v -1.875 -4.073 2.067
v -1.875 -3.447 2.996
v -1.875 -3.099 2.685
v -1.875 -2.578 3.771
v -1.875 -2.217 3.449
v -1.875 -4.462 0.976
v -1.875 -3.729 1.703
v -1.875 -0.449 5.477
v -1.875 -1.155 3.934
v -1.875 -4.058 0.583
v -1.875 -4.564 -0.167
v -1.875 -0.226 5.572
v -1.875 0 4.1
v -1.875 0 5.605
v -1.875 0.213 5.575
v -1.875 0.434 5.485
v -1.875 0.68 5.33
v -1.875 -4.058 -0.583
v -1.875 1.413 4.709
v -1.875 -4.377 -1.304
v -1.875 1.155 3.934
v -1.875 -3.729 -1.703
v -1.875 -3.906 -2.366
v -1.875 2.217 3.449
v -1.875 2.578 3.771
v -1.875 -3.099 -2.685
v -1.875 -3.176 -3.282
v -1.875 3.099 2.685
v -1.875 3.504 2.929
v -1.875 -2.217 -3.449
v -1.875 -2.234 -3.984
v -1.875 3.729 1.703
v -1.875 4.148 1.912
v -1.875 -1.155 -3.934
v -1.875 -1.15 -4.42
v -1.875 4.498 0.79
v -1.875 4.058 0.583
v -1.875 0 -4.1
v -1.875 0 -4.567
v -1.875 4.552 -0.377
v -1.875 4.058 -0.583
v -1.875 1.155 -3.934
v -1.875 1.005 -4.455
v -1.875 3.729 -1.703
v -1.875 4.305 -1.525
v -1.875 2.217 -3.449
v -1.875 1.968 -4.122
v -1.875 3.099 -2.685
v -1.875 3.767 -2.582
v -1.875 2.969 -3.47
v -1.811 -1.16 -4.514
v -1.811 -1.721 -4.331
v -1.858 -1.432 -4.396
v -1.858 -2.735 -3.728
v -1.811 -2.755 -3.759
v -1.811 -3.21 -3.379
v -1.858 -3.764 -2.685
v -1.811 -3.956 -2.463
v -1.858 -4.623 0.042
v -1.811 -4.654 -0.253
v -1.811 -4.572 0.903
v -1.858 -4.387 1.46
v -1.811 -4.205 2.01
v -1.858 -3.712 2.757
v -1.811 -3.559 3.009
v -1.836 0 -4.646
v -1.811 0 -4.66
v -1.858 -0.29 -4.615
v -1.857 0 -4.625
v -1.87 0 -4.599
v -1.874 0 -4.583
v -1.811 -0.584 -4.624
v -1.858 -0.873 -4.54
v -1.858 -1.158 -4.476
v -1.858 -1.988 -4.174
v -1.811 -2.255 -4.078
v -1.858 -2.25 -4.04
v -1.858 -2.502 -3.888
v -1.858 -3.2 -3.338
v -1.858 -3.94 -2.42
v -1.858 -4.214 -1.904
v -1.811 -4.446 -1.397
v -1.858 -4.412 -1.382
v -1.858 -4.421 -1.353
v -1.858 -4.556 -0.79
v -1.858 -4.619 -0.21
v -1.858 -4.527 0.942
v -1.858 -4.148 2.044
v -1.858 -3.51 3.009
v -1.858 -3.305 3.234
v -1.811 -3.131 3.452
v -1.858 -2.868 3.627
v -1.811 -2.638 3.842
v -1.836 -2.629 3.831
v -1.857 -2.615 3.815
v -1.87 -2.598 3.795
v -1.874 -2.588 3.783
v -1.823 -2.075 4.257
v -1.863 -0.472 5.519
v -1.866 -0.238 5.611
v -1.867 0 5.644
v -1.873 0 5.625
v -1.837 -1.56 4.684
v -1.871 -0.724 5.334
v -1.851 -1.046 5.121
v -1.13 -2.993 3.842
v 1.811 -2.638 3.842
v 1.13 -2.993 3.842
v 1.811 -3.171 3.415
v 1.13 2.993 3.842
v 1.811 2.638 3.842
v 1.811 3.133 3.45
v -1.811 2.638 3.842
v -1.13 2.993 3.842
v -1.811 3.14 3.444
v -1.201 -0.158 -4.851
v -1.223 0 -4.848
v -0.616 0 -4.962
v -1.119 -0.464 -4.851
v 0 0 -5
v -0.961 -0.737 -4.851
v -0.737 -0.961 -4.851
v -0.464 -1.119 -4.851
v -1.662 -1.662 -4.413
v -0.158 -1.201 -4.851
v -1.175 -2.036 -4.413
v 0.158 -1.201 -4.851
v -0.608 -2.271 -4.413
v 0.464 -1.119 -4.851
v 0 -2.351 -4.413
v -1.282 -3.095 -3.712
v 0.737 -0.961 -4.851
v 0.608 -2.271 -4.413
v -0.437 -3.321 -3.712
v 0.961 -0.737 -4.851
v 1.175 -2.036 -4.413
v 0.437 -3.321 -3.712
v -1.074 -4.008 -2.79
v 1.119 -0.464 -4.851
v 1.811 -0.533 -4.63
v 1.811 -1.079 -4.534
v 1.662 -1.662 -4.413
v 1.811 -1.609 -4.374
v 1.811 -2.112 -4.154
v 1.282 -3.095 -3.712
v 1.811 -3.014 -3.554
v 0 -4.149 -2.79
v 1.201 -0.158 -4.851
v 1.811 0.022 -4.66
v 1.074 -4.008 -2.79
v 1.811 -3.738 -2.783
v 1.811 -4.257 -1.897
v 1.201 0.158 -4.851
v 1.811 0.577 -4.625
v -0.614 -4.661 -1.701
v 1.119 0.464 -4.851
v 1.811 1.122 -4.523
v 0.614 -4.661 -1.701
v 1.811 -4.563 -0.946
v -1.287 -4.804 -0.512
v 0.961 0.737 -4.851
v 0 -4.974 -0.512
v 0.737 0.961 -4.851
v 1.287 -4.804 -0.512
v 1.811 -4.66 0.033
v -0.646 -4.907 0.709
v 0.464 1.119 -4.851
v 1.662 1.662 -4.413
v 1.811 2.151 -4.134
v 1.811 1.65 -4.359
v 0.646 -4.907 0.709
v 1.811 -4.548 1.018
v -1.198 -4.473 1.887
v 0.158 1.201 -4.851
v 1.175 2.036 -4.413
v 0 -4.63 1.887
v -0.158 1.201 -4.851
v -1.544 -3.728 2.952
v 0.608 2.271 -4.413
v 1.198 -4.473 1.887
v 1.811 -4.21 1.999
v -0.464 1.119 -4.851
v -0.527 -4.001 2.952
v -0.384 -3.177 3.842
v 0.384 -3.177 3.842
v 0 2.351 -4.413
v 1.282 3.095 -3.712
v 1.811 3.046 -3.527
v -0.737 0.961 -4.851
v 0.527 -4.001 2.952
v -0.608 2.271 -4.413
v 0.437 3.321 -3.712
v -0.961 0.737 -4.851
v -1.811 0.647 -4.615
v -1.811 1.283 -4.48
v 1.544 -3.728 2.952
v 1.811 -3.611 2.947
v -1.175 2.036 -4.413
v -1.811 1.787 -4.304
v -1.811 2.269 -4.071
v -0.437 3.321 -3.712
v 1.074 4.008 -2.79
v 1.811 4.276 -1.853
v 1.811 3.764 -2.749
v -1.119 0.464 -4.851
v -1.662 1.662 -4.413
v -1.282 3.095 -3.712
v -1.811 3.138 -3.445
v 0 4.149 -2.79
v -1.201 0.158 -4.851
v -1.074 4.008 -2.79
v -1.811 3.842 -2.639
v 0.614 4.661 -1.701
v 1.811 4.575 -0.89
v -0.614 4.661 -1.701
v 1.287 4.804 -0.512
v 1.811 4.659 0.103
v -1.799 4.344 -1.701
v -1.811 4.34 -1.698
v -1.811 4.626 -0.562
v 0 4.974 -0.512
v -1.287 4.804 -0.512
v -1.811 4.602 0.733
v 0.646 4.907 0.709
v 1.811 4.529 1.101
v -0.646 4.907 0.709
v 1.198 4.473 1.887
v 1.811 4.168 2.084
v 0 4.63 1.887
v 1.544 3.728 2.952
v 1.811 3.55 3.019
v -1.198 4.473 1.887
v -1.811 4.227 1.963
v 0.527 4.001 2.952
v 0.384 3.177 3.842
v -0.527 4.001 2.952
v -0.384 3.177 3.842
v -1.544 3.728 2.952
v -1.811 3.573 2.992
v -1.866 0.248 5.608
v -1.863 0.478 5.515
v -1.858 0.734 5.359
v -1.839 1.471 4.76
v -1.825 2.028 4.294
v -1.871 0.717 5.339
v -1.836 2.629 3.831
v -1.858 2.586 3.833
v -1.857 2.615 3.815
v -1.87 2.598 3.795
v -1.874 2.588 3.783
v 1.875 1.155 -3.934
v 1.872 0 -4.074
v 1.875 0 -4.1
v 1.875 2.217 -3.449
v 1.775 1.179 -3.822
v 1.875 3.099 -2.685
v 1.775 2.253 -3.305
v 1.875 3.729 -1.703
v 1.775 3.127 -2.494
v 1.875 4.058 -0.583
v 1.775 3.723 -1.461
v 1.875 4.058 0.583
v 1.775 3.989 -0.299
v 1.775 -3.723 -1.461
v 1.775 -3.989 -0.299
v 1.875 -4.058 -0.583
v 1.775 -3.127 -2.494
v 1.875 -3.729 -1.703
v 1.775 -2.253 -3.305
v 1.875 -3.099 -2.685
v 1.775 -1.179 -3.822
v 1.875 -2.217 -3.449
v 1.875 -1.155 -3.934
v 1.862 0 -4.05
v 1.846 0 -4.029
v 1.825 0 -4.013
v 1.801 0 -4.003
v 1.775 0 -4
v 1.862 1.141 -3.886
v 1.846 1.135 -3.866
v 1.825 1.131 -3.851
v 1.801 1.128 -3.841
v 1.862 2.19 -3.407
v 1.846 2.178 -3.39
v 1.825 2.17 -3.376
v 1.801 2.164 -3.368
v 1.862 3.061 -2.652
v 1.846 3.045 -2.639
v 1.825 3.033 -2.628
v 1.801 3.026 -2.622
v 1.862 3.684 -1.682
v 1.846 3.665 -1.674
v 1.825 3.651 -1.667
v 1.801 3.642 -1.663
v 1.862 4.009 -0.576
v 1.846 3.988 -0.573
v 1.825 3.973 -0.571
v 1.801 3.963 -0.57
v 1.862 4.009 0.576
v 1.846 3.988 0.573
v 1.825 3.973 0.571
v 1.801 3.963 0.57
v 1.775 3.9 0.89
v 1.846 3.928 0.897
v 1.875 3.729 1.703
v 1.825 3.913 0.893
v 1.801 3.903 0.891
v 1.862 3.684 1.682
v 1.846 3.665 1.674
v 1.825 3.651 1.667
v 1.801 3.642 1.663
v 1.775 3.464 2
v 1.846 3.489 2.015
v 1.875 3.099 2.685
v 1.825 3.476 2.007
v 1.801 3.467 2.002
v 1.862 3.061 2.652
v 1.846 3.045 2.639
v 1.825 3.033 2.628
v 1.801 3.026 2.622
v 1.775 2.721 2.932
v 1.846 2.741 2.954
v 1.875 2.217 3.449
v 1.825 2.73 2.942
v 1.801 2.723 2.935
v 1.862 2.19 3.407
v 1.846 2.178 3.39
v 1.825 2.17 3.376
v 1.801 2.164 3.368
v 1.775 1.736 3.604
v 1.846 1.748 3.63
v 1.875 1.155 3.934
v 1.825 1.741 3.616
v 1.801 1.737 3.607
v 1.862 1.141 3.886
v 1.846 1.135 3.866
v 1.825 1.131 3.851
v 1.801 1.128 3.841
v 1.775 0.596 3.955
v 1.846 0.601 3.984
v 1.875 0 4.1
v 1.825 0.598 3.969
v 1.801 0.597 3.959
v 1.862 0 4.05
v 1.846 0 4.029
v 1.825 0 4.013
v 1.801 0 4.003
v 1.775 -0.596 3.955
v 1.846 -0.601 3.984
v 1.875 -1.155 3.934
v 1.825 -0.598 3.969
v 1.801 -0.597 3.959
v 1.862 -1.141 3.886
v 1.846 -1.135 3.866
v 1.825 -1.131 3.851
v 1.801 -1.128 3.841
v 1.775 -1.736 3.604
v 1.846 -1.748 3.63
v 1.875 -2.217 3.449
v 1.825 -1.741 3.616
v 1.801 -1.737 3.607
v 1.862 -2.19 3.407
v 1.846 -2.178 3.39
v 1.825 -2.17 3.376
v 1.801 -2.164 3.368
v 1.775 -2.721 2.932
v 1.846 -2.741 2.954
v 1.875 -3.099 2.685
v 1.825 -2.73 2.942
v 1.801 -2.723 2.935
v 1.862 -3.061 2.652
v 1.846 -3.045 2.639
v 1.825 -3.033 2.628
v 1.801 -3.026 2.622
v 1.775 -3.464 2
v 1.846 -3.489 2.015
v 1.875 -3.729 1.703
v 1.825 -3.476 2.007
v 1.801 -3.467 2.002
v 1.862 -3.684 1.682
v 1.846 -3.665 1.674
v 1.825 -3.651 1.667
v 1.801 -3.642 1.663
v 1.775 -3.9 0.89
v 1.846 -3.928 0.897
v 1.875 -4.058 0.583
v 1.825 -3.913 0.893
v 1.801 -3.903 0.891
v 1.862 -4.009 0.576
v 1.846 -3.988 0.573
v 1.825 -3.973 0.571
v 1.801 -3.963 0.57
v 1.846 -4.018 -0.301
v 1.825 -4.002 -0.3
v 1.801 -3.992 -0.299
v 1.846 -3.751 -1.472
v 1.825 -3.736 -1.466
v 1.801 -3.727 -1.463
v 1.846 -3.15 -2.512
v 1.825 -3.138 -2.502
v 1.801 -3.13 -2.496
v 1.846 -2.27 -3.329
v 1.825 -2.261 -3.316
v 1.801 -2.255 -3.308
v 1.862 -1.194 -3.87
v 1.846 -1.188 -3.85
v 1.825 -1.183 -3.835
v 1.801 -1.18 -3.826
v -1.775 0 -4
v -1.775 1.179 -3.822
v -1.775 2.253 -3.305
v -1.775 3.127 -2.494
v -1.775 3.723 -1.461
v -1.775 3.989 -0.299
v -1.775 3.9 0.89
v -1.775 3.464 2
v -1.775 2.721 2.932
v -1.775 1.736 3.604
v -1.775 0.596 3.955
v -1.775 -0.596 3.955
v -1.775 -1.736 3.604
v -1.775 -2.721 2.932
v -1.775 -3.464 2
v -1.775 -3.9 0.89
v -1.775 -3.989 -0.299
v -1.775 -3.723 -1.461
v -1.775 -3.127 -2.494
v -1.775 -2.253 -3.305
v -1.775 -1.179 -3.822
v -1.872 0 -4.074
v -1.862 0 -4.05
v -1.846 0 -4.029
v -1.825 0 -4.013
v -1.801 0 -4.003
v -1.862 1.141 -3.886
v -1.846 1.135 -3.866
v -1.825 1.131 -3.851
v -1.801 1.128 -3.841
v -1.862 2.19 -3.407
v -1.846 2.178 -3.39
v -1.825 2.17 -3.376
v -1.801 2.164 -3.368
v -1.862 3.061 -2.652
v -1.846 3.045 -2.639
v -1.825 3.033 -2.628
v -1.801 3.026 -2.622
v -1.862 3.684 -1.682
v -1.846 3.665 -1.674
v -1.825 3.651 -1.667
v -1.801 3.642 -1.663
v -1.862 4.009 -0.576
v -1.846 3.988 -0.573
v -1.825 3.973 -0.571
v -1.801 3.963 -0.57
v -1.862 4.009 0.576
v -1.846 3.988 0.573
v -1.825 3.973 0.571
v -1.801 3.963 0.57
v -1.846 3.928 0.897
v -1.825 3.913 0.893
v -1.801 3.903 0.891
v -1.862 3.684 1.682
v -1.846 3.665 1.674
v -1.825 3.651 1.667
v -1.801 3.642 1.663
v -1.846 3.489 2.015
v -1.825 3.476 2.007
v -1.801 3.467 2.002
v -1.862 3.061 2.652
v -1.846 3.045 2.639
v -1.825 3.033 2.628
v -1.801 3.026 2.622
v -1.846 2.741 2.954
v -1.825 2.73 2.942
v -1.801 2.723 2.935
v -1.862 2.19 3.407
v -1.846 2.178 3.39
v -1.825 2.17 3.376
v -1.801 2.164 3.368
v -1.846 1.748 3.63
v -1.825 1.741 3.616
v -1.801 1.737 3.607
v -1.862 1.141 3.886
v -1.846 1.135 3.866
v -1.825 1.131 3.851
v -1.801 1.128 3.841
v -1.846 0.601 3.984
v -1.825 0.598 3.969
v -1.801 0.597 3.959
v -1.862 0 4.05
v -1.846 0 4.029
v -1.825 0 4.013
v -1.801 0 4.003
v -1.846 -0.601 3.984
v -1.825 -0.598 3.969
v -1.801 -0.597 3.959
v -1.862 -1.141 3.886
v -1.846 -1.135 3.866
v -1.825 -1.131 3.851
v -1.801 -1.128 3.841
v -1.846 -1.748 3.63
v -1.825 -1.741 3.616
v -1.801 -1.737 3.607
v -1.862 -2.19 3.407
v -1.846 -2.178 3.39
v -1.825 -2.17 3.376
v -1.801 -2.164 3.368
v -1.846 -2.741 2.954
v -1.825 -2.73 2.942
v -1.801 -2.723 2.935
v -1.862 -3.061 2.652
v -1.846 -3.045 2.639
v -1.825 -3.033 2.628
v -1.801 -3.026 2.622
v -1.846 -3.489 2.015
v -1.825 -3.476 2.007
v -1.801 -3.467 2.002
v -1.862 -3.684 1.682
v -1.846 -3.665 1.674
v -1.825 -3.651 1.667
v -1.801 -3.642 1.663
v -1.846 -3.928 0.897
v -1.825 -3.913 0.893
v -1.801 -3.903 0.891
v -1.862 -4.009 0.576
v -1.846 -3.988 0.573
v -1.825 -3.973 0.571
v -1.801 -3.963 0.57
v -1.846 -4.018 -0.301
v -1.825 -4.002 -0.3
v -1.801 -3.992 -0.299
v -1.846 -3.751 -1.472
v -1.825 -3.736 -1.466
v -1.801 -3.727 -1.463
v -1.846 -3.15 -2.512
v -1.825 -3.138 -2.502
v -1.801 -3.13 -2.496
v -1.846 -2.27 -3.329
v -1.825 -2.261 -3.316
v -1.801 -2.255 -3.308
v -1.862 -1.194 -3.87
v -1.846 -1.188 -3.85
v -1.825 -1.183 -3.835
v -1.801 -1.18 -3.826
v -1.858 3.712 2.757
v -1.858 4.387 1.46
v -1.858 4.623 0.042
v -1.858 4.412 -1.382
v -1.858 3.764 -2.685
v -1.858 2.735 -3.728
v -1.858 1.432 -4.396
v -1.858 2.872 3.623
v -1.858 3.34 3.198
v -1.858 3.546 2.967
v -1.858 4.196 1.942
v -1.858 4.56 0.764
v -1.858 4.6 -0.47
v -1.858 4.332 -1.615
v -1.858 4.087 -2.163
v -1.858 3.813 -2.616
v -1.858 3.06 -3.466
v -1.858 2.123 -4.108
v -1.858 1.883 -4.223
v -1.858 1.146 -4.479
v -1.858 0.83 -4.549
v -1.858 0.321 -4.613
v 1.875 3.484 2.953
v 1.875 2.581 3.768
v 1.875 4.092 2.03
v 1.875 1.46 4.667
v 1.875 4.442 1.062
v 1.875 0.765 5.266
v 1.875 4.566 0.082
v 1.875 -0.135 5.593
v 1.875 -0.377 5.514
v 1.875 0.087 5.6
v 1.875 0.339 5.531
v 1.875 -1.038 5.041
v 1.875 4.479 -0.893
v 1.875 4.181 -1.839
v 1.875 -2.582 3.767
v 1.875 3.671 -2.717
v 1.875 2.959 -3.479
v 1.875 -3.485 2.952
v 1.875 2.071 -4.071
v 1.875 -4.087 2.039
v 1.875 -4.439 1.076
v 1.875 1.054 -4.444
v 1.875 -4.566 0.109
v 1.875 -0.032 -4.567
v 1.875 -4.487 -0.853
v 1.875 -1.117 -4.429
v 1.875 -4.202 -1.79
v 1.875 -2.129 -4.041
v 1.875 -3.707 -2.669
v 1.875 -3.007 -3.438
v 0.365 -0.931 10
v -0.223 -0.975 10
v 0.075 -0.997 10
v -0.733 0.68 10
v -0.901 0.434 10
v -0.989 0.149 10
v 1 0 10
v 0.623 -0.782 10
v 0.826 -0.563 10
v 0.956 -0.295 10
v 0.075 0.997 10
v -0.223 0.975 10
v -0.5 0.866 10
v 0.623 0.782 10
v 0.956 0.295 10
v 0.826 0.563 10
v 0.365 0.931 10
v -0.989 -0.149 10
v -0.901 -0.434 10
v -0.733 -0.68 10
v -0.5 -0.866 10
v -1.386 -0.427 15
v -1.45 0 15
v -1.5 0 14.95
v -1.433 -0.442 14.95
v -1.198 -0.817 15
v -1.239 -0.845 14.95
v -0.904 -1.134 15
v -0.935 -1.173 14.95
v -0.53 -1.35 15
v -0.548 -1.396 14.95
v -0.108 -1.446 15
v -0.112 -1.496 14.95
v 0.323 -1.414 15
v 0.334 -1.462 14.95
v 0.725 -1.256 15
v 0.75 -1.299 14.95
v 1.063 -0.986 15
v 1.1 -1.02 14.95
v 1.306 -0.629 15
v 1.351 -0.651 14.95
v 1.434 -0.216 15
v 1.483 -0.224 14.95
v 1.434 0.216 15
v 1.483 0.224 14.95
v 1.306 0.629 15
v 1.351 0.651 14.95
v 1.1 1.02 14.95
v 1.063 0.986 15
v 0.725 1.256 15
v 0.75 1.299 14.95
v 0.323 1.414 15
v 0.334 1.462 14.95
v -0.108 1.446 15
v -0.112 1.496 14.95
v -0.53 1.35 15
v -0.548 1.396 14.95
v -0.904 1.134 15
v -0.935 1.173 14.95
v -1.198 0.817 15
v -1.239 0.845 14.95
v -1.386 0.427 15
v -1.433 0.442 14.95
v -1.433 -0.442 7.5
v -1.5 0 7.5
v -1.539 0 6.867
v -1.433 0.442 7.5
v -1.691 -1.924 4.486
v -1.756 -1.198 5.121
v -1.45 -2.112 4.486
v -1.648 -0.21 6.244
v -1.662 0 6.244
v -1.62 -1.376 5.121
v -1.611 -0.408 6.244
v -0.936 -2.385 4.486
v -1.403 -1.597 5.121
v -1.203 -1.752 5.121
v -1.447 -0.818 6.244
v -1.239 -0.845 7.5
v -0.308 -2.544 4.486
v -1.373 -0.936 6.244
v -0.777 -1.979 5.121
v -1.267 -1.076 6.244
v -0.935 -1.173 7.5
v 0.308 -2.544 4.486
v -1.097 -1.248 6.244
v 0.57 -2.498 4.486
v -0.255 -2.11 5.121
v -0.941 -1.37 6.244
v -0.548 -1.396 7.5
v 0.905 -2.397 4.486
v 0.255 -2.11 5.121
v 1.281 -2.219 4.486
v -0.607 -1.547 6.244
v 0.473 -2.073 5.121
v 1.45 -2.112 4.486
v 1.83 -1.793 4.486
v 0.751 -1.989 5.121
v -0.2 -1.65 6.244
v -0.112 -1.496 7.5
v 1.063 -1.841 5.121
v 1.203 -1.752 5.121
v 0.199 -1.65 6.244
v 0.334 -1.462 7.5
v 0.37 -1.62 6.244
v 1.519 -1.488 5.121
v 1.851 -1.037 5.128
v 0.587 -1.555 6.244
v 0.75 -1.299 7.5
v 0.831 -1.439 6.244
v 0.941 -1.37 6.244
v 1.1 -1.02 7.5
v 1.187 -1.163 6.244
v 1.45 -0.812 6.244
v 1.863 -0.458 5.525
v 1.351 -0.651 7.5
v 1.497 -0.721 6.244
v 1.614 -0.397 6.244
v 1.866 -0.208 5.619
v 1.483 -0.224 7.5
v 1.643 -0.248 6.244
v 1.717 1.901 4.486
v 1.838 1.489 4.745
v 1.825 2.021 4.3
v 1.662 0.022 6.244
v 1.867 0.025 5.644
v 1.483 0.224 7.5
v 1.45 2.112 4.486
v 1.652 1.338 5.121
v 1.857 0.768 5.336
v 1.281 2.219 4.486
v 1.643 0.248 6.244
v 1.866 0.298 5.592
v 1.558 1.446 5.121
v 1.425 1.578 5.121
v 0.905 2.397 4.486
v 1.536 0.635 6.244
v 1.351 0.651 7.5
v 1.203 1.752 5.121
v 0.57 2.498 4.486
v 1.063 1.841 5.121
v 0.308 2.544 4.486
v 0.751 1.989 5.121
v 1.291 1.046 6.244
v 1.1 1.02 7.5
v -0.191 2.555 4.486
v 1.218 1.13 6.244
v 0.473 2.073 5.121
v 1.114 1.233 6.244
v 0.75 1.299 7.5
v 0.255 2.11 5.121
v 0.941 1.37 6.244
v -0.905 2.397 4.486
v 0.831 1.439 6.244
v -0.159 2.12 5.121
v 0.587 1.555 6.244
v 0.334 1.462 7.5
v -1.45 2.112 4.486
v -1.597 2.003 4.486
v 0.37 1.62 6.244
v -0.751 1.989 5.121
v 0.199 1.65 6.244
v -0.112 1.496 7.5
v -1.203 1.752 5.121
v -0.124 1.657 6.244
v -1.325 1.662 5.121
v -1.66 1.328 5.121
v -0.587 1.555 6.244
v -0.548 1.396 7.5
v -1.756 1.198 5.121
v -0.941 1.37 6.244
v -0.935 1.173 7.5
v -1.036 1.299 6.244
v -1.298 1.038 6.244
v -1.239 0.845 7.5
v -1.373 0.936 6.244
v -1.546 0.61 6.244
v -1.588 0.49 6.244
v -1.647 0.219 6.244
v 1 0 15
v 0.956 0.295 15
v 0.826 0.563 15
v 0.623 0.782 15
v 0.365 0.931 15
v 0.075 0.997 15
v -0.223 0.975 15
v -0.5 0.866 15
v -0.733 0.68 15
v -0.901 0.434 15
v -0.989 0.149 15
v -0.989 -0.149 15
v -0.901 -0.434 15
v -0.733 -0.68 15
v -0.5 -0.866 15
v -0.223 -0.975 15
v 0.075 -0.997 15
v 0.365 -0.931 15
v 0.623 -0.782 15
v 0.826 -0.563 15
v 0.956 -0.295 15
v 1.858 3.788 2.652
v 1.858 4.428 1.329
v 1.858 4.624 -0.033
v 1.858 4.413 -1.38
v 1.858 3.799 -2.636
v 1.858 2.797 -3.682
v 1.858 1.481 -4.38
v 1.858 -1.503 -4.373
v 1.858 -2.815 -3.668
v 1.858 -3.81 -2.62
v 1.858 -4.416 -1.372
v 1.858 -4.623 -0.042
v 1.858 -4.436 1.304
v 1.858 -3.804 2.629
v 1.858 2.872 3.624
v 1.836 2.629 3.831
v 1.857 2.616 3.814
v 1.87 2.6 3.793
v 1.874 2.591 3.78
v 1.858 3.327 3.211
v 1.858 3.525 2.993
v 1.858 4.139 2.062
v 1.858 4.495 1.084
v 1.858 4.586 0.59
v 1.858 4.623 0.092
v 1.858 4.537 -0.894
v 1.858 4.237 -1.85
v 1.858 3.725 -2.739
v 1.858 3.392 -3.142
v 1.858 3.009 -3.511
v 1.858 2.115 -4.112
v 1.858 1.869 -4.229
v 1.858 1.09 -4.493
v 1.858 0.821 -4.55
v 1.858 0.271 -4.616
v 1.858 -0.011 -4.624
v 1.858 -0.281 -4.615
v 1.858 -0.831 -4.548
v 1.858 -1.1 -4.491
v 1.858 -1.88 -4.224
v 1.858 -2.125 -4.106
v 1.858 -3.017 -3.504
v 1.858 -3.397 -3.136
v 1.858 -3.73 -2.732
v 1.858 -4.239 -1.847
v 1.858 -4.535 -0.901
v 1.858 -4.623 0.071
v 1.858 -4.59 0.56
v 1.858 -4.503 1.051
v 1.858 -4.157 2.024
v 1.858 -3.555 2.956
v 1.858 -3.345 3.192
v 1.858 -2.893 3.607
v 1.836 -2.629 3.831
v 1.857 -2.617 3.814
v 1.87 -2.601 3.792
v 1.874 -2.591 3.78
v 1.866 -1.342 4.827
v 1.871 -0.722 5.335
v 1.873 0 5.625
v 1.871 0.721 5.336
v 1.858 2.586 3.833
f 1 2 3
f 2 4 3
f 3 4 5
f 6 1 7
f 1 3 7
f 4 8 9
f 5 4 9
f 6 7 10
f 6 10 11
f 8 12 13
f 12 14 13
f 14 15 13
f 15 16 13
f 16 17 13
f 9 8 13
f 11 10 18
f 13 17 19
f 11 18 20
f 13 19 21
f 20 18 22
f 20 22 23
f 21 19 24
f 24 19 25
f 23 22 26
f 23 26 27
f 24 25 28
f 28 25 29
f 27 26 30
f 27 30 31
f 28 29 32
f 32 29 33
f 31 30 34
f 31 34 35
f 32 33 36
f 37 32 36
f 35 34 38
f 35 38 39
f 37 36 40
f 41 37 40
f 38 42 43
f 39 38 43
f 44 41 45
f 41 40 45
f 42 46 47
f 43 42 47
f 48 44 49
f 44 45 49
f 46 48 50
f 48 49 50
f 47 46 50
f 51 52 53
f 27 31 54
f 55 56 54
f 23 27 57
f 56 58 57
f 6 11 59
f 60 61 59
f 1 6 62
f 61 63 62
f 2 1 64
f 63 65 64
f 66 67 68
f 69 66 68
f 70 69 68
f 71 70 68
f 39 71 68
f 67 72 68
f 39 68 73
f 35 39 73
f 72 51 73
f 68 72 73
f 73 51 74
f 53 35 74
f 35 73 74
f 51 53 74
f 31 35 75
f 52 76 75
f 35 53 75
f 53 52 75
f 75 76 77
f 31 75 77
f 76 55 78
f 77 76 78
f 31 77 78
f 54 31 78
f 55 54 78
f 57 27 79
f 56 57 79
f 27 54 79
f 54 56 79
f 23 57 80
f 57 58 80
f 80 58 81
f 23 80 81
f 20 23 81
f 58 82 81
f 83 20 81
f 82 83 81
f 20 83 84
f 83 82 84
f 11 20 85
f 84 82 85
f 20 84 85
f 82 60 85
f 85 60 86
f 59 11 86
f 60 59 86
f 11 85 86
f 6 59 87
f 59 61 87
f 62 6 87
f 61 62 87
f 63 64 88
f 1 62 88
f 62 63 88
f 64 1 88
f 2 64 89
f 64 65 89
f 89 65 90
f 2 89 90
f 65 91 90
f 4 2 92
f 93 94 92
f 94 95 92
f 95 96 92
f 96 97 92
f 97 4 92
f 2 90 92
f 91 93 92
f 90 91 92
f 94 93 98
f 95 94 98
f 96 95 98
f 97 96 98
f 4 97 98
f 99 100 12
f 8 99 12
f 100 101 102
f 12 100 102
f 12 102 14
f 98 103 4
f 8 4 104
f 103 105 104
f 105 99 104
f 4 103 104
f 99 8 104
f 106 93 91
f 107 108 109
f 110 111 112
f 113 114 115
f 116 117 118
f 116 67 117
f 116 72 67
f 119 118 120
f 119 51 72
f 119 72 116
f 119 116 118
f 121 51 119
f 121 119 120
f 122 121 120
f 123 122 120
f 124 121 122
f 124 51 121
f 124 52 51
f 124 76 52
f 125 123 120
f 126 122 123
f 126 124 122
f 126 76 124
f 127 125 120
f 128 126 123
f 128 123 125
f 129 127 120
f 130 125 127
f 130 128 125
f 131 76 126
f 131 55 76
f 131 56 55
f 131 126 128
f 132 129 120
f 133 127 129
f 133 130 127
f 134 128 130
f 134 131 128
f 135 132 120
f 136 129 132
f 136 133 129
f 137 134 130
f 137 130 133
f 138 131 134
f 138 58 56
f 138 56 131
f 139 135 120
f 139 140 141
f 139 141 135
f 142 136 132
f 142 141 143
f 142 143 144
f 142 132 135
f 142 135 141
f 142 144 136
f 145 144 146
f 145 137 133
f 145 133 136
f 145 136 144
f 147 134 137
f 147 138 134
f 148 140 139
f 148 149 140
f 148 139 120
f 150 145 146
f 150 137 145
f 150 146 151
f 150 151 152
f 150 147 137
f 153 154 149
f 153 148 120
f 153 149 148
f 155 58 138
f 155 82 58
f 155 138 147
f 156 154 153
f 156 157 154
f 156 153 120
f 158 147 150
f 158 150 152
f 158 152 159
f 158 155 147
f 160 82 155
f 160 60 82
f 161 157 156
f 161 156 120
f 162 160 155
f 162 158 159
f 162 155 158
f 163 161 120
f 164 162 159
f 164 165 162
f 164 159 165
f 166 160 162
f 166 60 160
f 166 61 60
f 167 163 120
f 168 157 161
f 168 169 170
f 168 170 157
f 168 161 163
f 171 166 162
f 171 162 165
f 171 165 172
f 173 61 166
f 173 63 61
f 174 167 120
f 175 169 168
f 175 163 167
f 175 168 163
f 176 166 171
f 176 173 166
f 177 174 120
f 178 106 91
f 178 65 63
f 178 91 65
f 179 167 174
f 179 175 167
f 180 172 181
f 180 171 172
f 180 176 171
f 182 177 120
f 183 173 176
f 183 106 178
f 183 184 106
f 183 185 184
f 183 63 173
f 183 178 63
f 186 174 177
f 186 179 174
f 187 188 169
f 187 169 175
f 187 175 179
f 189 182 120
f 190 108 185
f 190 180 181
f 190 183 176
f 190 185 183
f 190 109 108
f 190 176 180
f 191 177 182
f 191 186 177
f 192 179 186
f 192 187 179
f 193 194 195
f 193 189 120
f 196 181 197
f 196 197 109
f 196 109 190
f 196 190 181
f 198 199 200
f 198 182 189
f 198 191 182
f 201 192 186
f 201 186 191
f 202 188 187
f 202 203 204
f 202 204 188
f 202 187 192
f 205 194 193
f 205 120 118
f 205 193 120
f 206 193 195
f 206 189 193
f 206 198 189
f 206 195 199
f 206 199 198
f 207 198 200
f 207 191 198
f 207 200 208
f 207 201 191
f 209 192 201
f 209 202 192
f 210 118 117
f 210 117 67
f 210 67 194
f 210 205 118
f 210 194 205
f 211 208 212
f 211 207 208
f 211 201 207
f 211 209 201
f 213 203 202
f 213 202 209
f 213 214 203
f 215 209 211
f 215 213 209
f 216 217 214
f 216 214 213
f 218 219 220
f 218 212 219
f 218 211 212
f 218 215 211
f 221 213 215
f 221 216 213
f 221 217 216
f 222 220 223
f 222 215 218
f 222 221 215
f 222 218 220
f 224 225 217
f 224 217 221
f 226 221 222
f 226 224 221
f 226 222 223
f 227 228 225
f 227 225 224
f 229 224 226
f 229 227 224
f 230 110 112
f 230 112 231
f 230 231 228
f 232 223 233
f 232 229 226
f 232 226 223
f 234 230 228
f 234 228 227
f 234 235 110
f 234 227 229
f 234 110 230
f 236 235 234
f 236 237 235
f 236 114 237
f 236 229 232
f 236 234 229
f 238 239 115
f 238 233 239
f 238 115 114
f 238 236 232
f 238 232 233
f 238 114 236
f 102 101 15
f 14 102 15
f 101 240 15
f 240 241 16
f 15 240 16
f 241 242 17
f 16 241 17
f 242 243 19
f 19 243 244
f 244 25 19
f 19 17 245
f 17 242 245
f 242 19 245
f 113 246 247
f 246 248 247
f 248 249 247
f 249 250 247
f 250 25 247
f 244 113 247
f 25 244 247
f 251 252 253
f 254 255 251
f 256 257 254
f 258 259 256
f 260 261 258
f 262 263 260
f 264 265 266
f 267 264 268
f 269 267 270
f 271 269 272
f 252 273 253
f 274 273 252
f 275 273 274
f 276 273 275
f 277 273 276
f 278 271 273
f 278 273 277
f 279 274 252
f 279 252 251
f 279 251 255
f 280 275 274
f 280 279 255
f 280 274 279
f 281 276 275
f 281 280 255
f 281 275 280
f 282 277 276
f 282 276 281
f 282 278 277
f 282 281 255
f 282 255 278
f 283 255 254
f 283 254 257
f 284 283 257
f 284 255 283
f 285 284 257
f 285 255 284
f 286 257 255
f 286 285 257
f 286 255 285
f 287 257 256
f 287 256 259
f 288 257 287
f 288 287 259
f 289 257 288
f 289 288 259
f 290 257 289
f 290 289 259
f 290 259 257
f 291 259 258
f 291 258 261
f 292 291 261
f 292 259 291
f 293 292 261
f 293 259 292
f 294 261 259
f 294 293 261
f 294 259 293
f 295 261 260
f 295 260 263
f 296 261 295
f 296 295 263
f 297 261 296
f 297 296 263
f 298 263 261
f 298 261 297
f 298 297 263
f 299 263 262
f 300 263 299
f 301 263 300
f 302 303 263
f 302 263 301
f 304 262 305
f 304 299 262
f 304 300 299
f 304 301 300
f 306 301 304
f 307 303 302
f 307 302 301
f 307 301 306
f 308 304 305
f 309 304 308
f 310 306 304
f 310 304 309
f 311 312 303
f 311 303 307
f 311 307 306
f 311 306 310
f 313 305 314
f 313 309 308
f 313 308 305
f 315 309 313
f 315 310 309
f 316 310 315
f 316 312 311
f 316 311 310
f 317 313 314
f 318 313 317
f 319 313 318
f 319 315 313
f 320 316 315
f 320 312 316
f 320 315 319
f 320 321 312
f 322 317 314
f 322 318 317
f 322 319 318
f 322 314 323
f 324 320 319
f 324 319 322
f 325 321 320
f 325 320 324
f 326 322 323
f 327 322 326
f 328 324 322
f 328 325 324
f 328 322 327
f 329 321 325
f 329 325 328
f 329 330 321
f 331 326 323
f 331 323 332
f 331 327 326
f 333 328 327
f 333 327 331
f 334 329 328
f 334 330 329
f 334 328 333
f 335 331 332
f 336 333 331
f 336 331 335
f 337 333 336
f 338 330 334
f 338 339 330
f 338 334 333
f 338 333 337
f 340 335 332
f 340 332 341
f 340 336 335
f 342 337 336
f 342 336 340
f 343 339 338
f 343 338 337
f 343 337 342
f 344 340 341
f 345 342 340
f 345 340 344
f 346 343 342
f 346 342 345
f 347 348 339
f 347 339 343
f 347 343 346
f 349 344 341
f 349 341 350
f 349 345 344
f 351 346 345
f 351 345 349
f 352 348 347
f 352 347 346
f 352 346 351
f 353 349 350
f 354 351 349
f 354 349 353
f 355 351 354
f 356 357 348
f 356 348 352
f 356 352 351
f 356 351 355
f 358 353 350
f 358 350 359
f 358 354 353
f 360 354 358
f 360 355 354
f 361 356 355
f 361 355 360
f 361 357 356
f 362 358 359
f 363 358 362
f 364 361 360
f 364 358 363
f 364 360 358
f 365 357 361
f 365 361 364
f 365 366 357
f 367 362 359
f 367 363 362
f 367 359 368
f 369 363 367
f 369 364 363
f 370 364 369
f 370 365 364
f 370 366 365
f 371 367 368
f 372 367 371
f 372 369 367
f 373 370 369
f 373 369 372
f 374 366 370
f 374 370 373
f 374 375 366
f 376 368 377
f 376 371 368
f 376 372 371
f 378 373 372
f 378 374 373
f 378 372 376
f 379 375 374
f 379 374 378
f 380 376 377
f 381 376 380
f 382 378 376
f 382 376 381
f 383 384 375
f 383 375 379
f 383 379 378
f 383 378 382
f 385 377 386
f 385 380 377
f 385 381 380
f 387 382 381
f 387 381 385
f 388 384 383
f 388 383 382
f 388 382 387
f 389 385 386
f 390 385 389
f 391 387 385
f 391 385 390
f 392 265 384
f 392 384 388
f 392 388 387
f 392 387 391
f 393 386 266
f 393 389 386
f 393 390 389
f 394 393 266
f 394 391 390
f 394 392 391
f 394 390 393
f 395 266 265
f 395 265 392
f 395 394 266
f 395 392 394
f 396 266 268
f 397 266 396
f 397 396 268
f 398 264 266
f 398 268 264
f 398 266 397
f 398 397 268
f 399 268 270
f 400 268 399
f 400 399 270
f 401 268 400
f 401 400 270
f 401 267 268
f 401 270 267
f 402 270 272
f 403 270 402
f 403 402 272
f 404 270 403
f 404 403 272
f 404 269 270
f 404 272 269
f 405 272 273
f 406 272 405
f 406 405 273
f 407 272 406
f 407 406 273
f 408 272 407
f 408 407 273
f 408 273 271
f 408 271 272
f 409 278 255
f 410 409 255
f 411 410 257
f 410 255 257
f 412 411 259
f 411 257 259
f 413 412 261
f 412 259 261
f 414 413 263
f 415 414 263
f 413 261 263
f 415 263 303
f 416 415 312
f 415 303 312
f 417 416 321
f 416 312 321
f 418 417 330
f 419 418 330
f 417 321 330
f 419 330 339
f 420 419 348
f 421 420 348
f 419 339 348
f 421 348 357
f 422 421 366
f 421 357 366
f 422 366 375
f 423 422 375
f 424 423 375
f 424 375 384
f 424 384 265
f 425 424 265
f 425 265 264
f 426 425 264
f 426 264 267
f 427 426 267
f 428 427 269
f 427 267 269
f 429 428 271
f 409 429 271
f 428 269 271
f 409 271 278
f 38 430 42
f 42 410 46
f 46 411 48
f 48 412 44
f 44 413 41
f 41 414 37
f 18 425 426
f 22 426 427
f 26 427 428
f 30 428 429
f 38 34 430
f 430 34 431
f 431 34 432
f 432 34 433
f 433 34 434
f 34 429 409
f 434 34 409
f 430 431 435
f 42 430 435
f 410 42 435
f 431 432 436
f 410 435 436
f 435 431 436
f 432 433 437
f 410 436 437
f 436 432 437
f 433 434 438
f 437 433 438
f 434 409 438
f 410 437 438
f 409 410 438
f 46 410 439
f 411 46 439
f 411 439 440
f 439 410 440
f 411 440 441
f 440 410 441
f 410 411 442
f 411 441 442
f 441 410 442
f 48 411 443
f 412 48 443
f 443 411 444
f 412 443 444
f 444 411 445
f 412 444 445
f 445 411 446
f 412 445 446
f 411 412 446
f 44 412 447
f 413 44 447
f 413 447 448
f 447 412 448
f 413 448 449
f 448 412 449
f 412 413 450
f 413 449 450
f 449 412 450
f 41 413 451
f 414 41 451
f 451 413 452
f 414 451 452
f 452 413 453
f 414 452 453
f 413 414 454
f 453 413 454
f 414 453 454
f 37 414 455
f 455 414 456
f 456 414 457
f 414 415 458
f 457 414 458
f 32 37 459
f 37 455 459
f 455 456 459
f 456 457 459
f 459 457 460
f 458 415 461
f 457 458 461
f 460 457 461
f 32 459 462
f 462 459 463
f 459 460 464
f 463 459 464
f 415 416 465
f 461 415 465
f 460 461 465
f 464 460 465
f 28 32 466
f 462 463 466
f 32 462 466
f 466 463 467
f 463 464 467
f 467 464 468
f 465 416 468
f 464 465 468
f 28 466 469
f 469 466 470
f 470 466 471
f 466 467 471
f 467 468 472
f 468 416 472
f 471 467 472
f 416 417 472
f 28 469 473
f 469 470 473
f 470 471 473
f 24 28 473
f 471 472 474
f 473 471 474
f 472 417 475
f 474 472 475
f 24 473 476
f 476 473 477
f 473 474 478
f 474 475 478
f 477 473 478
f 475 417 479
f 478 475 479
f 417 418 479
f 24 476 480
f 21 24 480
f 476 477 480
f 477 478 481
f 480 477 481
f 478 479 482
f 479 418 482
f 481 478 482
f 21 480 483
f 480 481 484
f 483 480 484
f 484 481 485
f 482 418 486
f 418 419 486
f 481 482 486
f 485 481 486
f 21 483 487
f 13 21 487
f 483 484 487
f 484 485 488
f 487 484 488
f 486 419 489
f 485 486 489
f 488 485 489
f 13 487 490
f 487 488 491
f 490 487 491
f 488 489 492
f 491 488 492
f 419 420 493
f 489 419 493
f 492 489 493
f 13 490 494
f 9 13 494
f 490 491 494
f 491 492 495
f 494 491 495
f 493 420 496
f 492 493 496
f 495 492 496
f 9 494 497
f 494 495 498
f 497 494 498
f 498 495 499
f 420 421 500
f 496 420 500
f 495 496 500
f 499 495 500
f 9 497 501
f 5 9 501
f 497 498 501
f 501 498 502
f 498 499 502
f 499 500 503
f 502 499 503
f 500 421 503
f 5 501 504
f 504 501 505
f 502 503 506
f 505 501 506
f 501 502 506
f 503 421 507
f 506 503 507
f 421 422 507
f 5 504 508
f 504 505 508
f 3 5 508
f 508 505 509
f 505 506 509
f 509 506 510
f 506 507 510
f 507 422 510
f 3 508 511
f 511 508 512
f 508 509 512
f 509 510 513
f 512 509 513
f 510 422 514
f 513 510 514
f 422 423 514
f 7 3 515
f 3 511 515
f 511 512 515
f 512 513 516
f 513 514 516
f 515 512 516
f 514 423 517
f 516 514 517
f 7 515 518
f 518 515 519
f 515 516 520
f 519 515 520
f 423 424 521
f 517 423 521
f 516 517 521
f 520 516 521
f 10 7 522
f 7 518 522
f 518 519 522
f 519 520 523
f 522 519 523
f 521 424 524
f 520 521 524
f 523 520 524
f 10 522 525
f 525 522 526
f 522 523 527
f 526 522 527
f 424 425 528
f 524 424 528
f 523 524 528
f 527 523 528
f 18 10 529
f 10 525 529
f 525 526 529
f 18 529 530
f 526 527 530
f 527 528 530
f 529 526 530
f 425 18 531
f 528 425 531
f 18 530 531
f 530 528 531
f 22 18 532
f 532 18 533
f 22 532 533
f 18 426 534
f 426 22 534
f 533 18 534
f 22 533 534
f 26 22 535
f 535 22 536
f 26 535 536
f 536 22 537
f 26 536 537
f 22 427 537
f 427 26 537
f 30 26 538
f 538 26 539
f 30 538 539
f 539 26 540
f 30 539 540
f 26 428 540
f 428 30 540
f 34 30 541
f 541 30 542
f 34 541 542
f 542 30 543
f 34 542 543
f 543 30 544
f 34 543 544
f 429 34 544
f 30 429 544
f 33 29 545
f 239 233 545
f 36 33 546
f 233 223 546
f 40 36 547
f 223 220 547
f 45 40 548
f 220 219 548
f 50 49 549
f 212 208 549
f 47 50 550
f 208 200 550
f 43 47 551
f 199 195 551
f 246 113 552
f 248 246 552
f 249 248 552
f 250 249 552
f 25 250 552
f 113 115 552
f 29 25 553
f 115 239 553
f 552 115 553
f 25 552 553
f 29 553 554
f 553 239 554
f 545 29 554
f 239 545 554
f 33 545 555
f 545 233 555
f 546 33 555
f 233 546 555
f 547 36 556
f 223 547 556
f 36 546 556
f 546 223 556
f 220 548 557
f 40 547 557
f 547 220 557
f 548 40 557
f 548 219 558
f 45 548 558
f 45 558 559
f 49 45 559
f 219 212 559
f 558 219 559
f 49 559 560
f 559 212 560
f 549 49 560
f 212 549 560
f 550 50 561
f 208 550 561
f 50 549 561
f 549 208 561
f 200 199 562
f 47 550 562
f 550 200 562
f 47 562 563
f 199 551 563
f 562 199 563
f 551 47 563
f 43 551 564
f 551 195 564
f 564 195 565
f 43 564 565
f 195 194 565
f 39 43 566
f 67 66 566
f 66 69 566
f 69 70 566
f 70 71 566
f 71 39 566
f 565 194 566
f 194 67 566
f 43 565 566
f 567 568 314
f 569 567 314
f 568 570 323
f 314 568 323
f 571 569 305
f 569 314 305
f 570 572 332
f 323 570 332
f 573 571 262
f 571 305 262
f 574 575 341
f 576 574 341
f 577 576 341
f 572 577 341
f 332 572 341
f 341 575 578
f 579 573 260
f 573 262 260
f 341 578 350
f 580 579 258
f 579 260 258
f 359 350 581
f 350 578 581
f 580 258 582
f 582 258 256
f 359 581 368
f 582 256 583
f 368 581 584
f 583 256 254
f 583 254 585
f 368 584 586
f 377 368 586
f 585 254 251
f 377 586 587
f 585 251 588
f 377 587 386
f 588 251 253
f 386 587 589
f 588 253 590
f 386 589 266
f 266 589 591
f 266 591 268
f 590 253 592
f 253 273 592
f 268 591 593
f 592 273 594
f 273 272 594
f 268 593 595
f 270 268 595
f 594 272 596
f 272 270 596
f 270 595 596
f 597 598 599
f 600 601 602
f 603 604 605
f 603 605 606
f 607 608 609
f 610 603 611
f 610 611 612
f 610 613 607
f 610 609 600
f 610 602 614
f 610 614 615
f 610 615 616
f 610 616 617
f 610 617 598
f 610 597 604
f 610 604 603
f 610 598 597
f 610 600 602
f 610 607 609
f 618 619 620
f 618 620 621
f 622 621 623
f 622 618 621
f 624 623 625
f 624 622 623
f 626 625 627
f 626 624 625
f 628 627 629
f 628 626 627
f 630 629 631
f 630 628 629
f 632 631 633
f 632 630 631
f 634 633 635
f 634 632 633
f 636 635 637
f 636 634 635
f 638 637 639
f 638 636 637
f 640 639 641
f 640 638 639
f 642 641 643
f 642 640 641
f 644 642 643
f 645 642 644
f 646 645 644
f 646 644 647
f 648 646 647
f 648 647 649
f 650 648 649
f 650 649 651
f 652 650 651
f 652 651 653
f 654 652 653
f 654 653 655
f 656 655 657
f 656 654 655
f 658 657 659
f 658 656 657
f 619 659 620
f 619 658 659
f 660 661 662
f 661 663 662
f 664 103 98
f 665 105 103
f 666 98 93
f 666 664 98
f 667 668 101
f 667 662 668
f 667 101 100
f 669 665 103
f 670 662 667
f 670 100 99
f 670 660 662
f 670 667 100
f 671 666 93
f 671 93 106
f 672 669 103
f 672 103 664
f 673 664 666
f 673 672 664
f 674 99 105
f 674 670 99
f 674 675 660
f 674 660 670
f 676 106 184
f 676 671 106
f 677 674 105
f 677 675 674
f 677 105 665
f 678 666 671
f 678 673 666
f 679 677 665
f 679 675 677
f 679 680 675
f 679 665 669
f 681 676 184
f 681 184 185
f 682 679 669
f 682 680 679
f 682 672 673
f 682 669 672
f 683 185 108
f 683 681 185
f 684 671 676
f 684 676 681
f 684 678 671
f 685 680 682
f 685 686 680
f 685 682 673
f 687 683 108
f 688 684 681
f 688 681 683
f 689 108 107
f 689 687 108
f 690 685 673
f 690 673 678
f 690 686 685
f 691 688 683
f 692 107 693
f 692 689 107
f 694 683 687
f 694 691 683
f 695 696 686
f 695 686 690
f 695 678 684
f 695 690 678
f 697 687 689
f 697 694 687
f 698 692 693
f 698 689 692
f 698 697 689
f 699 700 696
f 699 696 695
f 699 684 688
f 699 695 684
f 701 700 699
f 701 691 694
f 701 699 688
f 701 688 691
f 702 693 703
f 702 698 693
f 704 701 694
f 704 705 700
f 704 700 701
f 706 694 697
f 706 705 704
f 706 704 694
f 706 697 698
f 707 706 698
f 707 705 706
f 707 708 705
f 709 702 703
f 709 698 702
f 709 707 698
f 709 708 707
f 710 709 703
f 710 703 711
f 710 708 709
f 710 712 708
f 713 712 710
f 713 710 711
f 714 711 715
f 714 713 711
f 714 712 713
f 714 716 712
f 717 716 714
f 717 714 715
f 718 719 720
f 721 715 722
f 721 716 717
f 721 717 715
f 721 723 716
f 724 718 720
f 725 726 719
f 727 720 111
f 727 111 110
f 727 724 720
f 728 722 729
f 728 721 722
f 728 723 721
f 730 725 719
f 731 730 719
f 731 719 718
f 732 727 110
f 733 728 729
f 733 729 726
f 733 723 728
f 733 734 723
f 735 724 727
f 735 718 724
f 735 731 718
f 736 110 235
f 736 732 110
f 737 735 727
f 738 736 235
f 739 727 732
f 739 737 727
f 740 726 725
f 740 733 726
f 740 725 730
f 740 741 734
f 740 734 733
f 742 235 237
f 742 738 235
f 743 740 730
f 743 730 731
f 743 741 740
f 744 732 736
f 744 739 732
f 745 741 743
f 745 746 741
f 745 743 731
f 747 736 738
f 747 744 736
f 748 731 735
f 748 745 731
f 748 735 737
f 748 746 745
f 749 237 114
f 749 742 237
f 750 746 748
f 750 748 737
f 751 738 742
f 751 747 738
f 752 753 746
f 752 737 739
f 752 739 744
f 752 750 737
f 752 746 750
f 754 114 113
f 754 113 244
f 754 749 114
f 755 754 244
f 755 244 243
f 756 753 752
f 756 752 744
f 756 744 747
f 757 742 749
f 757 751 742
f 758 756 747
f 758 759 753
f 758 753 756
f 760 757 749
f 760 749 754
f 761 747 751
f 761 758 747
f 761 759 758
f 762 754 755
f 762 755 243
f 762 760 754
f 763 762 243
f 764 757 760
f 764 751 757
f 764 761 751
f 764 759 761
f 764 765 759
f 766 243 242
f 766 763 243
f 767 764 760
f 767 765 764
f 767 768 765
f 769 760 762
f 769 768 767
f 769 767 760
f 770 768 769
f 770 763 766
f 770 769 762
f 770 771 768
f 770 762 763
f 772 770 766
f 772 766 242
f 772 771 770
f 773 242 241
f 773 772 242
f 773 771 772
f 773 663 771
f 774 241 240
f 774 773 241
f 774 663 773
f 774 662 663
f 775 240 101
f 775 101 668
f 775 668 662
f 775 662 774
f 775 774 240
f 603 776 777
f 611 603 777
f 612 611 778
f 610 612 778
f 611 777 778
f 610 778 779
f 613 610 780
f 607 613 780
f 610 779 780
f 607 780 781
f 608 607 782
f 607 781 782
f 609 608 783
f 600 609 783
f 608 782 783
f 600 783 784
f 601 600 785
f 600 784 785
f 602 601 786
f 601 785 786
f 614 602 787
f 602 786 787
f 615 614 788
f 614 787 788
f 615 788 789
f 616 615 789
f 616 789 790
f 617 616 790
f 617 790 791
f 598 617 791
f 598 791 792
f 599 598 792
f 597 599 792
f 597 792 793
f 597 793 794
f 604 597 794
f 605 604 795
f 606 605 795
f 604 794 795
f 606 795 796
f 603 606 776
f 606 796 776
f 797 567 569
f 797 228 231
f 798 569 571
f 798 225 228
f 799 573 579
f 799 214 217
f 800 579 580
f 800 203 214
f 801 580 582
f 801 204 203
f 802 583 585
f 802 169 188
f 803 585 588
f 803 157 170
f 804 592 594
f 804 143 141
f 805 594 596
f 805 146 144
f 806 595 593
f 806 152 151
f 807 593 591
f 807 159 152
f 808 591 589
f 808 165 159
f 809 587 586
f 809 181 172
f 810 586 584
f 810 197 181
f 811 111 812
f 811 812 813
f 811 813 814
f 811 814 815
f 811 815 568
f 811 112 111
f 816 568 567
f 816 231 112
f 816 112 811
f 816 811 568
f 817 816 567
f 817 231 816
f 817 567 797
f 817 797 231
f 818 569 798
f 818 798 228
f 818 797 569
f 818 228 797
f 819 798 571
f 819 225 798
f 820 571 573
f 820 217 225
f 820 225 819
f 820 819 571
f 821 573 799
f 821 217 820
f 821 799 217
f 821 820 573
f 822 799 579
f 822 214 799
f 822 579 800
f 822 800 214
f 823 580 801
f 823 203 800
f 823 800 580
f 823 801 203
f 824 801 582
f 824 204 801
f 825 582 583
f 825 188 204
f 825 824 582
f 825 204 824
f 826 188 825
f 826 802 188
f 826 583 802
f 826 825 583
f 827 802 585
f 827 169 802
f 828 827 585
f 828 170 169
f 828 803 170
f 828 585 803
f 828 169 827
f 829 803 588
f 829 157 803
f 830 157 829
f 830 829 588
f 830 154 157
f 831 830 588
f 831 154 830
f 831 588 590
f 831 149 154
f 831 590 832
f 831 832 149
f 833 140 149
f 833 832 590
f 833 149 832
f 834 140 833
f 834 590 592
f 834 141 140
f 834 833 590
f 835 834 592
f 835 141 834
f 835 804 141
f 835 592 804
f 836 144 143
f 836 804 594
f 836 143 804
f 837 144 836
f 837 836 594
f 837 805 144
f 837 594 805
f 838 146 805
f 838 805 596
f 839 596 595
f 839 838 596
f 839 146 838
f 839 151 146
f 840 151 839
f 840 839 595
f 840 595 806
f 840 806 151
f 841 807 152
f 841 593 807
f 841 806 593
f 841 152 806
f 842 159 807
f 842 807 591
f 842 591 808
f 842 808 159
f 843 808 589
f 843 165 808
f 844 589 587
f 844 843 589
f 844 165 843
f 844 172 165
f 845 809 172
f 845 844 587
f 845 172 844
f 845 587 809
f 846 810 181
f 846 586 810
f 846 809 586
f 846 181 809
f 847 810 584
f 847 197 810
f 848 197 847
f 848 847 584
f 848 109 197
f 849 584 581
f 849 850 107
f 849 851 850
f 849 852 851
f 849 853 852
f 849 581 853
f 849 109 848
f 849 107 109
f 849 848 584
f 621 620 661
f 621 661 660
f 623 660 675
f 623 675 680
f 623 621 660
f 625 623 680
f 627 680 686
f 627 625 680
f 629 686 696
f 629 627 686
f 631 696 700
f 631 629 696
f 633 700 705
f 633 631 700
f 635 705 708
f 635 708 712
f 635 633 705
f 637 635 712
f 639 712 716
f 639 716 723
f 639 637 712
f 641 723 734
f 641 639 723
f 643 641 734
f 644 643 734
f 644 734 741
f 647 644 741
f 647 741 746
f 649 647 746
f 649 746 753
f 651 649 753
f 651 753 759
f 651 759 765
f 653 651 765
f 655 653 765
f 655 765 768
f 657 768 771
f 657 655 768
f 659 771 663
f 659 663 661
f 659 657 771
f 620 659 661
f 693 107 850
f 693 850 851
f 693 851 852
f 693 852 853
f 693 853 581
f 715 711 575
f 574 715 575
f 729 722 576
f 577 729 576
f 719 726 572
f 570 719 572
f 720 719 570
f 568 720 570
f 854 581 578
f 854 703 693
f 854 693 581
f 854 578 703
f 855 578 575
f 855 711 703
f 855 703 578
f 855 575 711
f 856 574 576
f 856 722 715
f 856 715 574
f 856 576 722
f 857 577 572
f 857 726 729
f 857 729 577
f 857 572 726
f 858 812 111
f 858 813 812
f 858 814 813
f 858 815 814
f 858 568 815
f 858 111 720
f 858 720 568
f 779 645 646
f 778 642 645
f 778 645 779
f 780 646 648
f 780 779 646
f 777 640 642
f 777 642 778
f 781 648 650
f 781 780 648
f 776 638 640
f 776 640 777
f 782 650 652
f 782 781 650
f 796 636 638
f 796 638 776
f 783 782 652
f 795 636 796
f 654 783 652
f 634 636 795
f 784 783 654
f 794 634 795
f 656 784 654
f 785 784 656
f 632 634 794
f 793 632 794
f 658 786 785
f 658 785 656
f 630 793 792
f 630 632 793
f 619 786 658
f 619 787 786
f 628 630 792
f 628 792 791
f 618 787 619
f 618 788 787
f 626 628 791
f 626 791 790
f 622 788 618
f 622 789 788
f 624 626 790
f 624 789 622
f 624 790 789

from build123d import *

# Parameters (mm, degrees)
CUT_EXTRUDE2_DEPTH = 10
SKETCH5_R          = 4
CUT_EXTRUDE3_DEPTH = 10
FILLET1_R          = 0.1
SKETCH6_R          = 1
CUT_EXTRUDE4_DEPTH = 5
CHAMFER1_SIZE      = 0.05


with BuildPart() as part:
    # Sketch2 → Revolve1 (revolve)
    with BuildSketch(Plane(origin=(0, 0, 0), x_dir=(1, 0, 0), z_dir=(0, 1, 0))):
        with BuildLine():
            Line((-1.5, -15), (0, -15))
            Line((0, -15), (0, 5))
            ThreePointArc((0, 5), (-4.701618046, 1.701407579), (-3.199747431, -3.8420849))
            ThreePointArc((-3.199747431, -3.8420849), (-1.93956559, -5.480381879), (-1.5, -7.5))
            Line((-1.5, -7.5), (-1.5, -15))
        make_face()
    revolve(axis=Axis((0, 0, -5), (0, 0, 1)))

    # Sketch3 → Cut-Extrude2 (cut, symmetric)
    with BuildSketch(Plane(origin=(0, 0, 0), x_dir=(1, 0, 0), z_dir=(0, 1, 0))):
        with BuildLine():
            Line((1.875, -5.855071388), (1.875, 9.3726866))
            Line((1.875, 9.3726866), (7.480687136, 9.3726866))
            Line((7.480687136, 9.3726866), (7.480687136, -15.437316242))
            Line((7.480687136, -15.437316242), (2.779239779, -8.722953569))
            ThreePointArc((2.779239779, -8.722953569), (2.106415246, -7.358600385), (1.875, -5.855071388))
        make_face()
        with BuildLine():
            Line((-1.875, 9.3726866), (-7.480687136, 9.3726866))
            Line((-7.480687136, 9.3726866), (-7.480687136, -15.437316242))
            Line((-7.480687136, -15.437316242), (-2.779239779, -8.722953569))
            ThreePointArc((-2.779239779, -8.722953569), (-2.106415246, -7.358600385), (-1.875, -5.855071388))
            Line((-1.875, -5.855071388), (-1.875, 9.3726866))
        make_face()
    extrude(amount=CUT_EXTRUDE2_DEPTH, both=True, mode=Mode.SUBTRACT)

    # Sketch5 → Cut-Extrude3 (cut, symmetric)
    with BuildSketch(Plane(origin=(0, 0, 0), x_dir=(0, 0, -1), z_dir=(1, 0, 0))):
        Circle(SKETCH5_R)
    extrude(amount=CUT_EXTRUDE3_DEPTH, both=True, mode=Mode.SUBTRACT)

    # Fillet1
    fillet1_edges = [part.edges().sort_by_distance(p)[0] for p in [
        (-1.875, -1.344126033, 4.829899297),
        (1.875, 0, 5.625682901),
        (1.875, 0, -4.635124054),
        (-1.875, -4.432432466, -1.355698134),
        (1.875, 0, 4),
        (-1.875, 0, 4),
    ]]
    fillet(fillet1_edges, radius=FILLET1_R)

    # Sketch6 → Cut-Extrude4 (cut)
    with BuildSketch(Plane.XY.offset(15)):
        Circle(SKETCH6_R)
    extrude(amount=-CUT_EXTRUDE4_DEPTH, mode=Mode.SUBTRACT)

    # Chamfer1
    chamfer1_edges = [part.edges().sort_by_distance(p)[0] for p in [
        (1.5, 0, 15),
    ]]
    chamfer(chamfer1_edges, length=CHAMFER1_SIZE)


solid = part.part
